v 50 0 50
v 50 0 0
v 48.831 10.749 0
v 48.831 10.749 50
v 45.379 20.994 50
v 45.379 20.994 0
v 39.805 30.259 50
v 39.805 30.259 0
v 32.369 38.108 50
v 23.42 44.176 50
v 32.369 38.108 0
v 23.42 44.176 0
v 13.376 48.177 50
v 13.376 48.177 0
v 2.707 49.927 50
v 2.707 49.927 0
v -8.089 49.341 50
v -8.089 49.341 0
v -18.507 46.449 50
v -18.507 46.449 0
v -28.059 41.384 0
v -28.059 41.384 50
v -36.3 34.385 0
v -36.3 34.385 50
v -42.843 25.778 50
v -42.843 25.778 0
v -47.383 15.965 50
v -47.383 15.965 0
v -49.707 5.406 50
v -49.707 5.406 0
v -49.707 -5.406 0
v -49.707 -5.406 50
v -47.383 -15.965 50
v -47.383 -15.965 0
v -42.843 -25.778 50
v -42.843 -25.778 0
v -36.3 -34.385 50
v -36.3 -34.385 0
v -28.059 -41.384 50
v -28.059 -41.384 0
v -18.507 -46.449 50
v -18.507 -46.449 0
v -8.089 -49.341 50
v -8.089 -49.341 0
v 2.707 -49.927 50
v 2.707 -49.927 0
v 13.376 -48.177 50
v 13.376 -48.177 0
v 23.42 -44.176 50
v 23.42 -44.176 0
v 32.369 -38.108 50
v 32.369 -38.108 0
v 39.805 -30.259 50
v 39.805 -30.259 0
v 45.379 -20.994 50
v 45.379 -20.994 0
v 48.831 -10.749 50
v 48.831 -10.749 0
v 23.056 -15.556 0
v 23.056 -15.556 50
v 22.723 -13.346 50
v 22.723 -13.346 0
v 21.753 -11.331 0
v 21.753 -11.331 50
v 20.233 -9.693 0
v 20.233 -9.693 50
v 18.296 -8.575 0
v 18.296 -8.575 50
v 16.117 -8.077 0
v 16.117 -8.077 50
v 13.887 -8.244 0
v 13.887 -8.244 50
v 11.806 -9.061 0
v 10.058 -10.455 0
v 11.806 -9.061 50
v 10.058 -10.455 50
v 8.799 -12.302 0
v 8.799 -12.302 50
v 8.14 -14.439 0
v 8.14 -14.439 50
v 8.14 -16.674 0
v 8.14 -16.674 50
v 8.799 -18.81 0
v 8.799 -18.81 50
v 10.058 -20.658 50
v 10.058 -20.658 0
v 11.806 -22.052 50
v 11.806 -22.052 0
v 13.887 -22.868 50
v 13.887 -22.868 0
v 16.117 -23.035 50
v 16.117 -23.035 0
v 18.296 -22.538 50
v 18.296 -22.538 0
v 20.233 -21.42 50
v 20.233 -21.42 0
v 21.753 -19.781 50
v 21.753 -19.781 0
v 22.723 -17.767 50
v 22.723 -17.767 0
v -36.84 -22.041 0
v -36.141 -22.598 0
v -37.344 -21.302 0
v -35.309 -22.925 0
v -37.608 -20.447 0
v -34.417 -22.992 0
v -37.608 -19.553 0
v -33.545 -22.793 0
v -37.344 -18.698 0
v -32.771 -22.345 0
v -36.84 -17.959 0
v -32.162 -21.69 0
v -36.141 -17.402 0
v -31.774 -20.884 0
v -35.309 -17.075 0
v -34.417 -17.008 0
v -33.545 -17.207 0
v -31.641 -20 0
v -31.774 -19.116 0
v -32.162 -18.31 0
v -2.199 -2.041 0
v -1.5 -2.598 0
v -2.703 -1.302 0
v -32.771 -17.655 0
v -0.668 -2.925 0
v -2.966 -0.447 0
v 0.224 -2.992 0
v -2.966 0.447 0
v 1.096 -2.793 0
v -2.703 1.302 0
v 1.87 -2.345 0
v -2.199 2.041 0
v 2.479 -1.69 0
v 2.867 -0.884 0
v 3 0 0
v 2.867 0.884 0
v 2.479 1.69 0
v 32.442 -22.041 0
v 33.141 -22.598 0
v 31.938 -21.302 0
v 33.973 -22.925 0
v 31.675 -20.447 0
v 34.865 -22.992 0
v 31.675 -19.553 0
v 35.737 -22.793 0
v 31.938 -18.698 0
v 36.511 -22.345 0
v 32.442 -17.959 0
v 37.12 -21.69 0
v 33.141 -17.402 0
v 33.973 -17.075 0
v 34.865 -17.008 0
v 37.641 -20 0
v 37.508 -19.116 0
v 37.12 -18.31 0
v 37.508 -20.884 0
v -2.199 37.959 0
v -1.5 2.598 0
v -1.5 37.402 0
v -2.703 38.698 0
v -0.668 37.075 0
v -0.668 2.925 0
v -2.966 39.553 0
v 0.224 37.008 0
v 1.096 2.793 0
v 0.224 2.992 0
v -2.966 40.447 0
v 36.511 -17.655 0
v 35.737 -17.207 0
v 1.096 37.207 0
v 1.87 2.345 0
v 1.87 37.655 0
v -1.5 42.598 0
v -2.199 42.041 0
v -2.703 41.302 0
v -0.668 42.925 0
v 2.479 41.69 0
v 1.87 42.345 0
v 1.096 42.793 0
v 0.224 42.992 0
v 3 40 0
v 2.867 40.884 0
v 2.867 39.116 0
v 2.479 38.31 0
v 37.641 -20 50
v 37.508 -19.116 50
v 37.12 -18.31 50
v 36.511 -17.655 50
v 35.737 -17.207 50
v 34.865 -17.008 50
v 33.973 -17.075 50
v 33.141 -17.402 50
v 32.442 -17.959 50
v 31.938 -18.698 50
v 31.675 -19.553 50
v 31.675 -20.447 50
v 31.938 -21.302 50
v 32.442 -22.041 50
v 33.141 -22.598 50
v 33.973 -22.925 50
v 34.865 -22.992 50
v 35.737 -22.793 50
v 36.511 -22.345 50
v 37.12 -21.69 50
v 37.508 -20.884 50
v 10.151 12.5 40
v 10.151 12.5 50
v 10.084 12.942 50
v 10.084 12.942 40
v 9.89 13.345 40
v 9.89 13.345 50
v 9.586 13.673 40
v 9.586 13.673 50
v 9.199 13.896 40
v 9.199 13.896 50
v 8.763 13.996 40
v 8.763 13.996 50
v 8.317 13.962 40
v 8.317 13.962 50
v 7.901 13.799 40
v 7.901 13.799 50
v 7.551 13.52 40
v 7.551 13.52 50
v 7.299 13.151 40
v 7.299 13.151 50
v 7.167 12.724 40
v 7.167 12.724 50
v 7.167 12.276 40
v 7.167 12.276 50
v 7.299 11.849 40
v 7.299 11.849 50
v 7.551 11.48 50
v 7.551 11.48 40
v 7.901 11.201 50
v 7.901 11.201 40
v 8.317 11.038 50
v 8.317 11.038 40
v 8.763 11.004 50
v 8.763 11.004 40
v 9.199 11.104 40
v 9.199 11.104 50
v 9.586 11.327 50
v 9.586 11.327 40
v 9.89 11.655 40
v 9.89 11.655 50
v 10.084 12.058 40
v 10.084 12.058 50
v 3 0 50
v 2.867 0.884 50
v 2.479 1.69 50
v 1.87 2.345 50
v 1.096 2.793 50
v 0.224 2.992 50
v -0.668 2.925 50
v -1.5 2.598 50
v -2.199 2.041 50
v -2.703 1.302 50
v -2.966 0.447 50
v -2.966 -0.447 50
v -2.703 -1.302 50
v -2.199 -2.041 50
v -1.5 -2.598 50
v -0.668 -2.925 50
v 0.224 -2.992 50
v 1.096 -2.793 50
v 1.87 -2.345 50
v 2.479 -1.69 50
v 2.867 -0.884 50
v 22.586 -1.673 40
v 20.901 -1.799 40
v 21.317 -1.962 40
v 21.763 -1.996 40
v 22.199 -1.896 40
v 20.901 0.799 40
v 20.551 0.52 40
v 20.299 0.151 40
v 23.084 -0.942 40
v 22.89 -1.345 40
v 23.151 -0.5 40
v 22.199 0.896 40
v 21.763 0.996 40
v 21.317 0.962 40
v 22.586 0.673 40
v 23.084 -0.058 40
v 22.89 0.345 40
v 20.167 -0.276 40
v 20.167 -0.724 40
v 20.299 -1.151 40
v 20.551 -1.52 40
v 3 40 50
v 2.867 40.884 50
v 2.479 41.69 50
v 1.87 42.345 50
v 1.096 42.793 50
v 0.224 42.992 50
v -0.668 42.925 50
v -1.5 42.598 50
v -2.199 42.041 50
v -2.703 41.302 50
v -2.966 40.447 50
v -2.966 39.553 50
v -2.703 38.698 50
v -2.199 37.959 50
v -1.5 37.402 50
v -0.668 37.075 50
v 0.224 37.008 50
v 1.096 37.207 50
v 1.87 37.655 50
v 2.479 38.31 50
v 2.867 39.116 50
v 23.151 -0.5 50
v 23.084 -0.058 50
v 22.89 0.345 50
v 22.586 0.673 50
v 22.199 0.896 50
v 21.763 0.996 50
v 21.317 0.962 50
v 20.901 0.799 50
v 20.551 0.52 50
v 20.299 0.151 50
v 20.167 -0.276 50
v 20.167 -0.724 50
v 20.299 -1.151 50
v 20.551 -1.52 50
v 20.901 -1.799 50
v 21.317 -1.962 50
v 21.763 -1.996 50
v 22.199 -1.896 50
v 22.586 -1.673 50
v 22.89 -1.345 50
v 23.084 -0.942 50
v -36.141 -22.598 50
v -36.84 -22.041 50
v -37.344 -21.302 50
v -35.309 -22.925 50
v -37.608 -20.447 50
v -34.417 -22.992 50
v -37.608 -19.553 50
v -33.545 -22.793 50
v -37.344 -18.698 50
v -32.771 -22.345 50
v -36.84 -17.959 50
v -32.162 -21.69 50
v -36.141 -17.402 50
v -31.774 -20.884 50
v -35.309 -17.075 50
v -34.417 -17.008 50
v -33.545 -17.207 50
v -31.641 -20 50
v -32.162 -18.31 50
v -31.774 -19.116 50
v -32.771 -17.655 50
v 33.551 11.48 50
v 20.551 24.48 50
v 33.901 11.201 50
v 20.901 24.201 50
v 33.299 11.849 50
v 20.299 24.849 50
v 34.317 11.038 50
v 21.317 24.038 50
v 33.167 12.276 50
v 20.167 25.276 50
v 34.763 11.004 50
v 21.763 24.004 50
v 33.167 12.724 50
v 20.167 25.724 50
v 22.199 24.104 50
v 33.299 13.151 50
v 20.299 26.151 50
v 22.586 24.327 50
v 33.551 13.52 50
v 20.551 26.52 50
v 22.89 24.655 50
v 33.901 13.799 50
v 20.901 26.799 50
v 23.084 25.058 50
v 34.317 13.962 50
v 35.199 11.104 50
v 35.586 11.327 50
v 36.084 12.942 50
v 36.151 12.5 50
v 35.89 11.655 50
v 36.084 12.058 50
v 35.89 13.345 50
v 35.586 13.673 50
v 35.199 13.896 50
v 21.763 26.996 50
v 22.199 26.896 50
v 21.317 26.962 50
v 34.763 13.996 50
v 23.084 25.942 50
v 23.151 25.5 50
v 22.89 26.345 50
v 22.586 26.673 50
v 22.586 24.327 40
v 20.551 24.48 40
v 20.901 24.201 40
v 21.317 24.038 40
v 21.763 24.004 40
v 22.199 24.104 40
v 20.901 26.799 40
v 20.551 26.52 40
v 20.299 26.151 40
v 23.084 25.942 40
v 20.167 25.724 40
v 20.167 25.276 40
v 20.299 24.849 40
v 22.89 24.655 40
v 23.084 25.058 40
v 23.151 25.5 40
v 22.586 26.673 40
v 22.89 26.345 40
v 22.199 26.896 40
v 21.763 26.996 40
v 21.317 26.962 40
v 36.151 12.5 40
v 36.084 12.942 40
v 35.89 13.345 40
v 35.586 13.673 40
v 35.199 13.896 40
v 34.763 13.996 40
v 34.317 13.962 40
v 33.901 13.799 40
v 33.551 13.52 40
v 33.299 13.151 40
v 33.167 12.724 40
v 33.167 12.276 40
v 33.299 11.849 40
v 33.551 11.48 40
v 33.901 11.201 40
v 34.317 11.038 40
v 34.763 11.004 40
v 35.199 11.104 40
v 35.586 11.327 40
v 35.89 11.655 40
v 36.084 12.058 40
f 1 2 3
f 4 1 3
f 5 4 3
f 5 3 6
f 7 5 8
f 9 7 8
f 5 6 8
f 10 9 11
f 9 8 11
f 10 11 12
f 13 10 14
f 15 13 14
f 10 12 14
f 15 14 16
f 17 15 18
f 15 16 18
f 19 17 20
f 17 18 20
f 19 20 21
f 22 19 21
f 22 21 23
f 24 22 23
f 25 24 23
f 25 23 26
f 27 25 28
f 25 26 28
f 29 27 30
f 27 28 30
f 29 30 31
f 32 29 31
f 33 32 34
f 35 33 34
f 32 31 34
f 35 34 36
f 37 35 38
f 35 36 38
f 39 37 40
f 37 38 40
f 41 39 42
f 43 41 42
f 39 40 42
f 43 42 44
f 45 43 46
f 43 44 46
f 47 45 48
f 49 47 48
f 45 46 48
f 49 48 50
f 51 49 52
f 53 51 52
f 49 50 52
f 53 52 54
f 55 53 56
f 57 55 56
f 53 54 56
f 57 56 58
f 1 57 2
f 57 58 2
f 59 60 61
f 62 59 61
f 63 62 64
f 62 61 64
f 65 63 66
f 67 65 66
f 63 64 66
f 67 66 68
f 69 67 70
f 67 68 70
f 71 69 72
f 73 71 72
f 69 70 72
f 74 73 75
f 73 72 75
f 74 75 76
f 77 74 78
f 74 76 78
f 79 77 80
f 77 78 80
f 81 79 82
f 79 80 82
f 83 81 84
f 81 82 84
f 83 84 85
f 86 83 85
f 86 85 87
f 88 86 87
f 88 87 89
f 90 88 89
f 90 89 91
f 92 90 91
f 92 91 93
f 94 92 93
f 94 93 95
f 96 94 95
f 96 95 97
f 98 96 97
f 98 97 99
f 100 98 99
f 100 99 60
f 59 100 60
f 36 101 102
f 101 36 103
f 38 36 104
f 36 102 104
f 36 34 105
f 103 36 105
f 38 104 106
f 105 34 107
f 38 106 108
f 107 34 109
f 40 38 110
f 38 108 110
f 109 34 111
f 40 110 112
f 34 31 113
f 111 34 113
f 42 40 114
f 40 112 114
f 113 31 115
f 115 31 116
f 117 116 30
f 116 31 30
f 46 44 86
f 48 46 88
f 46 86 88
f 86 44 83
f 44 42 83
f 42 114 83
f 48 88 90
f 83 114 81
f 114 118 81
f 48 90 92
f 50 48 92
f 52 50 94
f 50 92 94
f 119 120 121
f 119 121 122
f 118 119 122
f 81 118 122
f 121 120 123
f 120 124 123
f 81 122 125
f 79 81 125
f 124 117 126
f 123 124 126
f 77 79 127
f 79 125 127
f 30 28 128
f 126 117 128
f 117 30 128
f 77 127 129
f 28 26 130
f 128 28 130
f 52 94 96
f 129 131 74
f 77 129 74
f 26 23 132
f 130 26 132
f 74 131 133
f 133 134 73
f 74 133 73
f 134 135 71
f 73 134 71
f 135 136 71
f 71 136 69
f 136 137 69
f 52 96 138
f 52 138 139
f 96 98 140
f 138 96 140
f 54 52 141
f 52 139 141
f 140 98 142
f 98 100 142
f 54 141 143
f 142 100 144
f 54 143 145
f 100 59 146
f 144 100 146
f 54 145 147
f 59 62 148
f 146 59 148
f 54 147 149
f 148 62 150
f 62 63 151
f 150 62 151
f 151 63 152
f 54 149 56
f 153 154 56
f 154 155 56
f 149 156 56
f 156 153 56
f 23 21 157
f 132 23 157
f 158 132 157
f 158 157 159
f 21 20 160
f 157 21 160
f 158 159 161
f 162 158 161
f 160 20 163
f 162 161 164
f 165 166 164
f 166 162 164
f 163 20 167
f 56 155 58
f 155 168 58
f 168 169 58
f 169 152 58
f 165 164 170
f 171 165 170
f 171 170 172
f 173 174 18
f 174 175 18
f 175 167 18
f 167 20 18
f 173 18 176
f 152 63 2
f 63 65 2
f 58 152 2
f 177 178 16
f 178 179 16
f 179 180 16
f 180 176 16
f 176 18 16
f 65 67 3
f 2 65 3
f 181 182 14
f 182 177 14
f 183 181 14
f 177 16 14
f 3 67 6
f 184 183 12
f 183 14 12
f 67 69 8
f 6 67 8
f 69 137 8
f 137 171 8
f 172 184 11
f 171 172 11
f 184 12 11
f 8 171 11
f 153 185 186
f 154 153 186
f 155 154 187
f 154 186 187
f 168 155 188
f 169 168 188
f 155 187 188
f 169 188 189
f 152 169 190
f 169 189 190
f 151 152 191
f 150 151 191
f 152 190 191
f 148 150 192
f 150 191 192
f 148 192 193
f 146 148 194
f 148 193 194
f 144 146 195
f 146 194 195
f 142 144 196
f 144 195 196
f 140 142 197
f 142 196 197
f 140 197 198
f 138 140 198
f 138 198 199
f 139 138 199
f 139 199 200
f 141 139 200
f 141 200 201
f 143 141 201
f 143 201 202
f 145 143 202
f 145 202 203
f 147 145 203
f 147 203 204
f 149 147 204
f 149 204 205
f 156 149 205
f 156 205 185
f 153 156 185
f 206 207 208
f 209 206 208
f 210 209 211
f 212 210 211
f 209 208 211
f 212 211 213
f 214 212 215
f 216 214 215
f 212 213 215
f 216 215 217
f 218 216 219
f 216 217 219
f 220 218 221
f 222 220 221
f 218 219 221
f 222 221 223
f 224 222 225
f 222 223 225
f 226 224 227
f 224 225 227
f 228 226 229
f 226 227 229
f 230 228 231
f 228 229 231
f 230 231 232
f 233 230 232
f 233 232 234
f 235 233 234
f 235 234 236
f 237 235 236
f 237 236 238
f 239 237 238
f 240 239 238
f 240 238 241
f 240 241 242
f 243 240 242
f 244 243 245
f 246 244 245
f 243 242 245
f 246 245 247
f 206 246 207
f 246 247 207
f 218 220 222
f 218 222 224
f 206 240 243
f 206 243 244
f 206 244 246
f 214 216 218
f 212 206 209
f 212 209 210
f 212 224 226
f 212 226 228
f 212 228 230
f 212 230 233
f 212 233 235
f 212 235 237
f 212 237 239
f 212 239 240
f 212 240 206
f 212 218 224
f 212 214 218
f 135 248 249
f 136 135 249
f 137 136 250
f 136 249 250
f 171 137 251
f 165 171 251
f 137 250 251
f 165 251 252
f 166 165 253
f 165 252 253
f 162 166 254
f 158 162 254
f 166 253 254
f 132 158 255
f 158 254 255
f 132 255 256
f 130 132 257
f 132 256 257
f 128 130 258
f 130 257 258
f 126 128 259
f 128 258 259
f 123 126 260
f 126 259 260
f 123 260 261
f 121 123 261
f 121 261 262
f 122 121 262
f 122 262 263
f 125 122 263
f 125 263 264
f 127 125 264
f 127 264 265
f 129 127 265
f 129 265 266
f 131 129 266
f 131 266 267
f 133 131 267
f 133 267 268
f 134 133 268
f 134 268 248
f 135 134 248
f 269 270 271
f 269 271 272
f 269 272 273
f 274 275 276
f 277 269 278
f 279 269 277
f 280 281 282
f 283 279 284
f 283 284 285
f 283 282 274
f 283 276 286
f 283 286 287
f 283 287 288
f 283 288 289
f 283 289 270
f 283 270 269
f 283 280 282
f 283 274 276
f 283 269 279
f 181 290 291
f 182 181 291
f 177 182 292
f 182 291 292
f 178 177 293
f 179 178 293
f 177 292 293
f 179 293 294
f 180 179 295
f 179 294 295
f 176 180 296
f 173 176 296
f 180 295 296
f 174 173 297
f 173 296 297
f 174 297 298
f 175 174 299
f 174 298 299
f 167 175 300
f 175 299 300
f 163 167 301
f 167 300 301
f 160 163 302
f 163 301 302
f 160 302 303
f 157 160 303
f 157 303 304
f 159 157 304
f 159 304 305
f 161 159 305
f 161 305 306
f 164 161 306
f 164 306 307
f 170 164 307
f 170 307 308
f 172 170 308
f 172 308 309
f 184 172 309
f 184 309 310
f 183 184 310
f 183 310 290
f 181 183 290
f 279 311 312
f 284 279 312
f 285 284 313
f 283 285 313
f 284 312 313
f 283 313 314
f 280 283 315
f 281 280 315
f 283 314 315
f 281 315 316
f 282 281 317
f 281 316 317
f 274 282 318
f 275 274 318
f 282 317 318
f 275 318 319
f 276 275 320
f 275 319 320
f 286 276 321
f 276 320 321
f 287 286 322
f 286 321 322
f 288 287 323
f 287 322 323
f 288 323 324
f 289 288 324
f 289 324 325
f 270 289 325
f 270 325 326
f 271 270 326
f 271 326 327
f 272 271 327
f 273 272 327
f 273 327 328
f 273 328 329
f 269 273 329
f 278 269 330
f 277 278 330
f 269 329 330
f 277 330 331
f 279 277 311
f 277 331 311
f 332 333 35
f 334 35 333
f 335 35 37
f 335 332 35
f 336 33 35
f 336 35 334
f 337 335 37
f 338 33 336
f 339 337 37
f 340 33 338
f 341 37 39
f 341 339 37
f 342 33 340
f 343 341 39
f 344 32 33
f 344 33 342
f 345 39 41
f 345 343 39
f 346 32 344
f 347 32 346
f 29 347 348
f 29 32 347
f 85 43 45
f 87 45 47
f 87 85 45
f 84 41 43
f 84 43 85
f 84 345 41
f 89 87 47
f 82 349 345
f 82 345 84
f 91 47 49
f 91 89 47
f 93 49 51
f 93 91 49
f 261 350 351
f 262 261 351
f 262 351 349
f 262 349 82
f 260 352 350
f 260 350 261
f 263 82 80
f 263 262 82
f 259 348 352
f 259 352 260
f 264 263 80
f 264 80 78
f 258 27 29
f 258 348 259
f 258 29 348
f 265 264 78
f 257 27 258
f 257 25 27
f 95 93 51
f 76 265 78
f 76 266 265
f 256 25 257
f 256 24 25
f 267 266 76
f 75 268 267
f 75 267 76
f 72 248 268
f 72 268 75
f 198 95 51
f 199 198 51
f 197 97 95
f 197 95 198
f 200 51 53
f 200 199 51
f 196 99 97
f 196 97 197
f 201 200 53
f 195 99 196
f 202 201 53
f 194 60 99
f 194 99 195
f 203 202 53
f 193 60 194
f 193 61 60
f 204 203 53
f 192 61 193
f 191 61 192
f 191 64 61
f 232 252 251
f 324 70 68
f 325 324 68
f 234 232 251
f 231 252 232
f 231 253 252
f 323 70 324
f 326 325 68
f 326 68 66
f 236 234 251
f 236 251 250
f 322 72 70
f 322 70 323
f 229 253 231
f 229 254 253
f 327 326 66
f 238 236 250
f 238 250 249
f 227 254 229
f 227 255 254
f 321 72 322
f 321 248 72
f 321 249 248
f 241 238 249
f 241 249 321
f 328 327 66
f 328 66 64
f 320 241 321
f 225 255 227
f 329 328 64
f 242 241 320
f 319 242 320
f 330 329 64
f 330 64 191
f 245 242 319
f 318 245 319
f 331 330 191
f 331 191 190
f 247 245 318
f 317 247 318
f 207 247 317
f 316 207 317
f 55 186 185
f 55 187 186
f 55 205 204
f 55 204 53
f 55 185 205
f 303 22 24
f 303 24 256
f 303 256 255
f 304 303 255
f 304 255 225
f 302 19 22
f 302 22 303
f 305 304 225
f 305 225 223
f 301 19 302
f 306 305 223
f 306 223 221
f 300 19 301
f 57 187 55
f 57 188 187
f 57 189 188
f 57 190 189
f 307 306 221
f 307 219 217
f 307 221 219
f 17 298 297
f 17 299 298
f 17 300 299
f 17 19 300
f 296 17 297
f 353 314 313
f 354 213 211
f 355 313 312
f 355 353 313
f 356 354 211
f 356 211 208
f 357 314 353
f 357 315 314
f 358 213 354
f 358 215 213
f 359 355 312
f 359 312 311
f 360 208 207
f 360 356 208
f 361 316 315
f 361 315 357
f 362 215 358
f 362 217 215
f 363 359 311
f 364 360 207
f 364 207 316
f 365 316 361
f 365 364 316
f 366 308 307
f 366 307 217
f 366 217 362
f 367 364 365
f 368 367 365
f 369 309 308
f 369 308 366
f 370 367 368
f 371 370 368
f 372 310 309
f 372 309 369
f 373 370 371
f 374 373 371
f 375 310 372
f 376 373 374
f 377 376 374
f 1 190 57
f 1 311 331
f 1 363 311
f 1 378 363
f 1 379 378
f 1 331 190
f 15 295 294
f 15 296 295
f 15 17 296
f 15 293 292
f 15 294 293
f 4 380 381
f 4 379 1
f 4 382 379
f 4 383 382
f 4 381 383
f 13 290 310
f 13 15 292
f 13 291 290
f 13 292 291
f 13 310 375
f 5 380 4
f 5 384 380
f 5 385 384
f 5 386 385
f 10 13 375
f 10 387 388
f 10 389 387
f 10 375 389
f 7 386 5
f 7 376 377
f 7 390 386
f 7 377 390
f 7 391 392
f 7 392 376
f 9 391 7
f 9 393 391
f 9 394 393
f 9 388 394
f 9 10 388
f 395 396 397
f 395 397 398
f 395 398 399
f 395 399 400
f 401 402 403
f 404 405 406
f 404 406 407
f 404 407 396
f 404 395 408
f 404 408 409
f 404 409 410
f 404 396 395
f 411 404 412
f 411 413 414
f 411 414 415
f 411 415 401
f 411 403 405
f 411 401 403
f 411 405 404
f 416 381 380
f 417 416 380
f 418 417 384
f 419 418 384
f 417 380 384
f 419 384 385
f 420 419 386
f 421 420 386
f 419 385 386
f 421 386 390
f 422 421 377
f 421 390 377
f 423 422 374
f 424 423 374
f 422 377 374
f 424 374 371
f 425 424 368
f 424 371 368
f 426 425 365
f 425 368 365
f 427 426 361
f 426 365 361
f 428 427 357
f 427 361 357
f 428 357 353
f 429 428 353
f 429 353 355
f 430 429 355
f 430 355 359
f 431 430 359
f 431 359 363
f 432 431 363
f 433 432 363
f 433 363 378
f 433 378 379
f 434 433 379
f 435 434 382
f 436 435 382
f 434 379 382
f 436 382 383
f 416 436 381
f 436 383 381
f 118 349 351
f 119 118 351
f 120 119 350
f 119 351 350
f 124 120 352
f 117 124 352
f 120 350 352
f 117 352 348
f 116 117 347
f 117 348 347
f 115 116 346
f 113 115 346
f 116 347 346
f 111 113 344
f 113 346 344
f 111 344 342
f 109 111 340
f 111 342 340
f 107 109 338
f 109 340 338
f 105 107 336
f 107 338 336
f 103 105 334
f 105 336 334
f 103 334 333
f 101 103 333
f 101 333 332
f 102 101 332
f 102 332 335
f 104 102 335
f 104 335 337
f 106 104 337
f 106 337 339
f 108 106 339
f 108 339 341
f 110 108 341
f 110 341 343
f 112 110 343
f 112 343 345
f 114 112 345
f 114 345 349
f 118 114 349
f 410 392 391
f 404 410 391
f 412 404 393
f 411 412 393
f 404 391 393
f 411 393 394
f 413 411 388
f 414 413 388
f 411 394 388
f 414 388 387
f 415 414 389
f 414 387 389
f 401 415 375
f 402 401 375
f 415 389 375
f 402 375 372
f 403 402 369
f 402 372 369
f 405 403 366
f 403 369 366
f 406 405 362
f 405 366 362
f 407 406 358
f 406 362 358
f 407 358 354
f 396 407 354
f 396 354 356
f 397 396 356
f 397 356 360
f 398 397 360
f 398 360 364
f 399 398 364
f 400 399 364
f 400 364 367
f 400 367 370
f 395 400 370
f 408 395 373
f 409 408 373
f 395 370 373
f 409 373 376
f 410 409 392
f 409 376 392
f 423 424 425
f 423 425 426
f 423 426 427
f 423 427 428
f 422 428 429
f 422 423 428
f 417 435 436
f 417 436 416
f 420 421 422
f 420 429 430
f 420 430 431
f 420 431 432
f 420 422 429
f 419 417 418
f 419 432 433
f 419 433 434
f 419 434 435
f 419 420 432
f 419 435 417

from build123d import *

# Parameters (mm, degrees)
SKETCH1_R           = 50
BOSS_EXTRUDE1_DEPTH = 50
SKETCH2_R           = 3
CUT_EXTRUDE1_DEPTH  = 87.602540378
SKETCH6_R           = 1.5
CUT_EXTRUDE2_DEPTH  = 10
SKETCH7_R           = 7.5
CUT_EXTRUDE3_DEPTH  = 87.602540378


with BuildPart() as part:
    # Sketch1 → Boss-Extrude1 (new body)
    with BuildSketch(Plane.XY):
        Circle(SKETCH1_R)
    extrude(amount=BOSS_EXTRUDE1_DEPTH)

    # Sketch2 → Cut-Extrude1 (cut, through all)
    with BuildSketch(Plane.XY.offset(50)):
        with Locations((0, 40)):
            Circle(SKETCH2_R)
        with Locations((34.641016151, -20)):
            Circle(SKETCH2_R)
        with Locations((-34.641016151, -20)):
            Circle(SKETCH2_R)
        Circle(SKETCH2_R)
    extrude(amount=-CUT_EXTRUDE1_DEPTH, mode=Mode.SUBTRACT)

    # Sketch6 → Cut-Extrude2 (cut)
    with BuildSketch(Plane.XY.offset(50)):
        with Locations((21.650635095, 25.5)):
            Circle(SKETCH6_R)
        with Locations((34.650635095, 12.5)):
            Circle(SKETCH6_R)
        with Locations((21.650635095, -0.5)):
            Circle(SKETCH6_R)
        with Locations((8.650635095, 12.5)):
            Circle(SKETCH6_R)
    extrude(amount=-CUT_EXTRUDE2_DEPTH, mode=Mode.SUBTRACT)

    # Sketch7 → Cut-Extrude3 (cut, through all)
    with BuildSketch(Plane.XY.offset(50)):
        with Locations((15.556349186, -15.556349186)):
            Circle(SKETCH7_R)
    extrude(amount=-CUT_EXTRUDE3_DEPTH, mode=Mode.SUBTRACT)


solid = part.part
